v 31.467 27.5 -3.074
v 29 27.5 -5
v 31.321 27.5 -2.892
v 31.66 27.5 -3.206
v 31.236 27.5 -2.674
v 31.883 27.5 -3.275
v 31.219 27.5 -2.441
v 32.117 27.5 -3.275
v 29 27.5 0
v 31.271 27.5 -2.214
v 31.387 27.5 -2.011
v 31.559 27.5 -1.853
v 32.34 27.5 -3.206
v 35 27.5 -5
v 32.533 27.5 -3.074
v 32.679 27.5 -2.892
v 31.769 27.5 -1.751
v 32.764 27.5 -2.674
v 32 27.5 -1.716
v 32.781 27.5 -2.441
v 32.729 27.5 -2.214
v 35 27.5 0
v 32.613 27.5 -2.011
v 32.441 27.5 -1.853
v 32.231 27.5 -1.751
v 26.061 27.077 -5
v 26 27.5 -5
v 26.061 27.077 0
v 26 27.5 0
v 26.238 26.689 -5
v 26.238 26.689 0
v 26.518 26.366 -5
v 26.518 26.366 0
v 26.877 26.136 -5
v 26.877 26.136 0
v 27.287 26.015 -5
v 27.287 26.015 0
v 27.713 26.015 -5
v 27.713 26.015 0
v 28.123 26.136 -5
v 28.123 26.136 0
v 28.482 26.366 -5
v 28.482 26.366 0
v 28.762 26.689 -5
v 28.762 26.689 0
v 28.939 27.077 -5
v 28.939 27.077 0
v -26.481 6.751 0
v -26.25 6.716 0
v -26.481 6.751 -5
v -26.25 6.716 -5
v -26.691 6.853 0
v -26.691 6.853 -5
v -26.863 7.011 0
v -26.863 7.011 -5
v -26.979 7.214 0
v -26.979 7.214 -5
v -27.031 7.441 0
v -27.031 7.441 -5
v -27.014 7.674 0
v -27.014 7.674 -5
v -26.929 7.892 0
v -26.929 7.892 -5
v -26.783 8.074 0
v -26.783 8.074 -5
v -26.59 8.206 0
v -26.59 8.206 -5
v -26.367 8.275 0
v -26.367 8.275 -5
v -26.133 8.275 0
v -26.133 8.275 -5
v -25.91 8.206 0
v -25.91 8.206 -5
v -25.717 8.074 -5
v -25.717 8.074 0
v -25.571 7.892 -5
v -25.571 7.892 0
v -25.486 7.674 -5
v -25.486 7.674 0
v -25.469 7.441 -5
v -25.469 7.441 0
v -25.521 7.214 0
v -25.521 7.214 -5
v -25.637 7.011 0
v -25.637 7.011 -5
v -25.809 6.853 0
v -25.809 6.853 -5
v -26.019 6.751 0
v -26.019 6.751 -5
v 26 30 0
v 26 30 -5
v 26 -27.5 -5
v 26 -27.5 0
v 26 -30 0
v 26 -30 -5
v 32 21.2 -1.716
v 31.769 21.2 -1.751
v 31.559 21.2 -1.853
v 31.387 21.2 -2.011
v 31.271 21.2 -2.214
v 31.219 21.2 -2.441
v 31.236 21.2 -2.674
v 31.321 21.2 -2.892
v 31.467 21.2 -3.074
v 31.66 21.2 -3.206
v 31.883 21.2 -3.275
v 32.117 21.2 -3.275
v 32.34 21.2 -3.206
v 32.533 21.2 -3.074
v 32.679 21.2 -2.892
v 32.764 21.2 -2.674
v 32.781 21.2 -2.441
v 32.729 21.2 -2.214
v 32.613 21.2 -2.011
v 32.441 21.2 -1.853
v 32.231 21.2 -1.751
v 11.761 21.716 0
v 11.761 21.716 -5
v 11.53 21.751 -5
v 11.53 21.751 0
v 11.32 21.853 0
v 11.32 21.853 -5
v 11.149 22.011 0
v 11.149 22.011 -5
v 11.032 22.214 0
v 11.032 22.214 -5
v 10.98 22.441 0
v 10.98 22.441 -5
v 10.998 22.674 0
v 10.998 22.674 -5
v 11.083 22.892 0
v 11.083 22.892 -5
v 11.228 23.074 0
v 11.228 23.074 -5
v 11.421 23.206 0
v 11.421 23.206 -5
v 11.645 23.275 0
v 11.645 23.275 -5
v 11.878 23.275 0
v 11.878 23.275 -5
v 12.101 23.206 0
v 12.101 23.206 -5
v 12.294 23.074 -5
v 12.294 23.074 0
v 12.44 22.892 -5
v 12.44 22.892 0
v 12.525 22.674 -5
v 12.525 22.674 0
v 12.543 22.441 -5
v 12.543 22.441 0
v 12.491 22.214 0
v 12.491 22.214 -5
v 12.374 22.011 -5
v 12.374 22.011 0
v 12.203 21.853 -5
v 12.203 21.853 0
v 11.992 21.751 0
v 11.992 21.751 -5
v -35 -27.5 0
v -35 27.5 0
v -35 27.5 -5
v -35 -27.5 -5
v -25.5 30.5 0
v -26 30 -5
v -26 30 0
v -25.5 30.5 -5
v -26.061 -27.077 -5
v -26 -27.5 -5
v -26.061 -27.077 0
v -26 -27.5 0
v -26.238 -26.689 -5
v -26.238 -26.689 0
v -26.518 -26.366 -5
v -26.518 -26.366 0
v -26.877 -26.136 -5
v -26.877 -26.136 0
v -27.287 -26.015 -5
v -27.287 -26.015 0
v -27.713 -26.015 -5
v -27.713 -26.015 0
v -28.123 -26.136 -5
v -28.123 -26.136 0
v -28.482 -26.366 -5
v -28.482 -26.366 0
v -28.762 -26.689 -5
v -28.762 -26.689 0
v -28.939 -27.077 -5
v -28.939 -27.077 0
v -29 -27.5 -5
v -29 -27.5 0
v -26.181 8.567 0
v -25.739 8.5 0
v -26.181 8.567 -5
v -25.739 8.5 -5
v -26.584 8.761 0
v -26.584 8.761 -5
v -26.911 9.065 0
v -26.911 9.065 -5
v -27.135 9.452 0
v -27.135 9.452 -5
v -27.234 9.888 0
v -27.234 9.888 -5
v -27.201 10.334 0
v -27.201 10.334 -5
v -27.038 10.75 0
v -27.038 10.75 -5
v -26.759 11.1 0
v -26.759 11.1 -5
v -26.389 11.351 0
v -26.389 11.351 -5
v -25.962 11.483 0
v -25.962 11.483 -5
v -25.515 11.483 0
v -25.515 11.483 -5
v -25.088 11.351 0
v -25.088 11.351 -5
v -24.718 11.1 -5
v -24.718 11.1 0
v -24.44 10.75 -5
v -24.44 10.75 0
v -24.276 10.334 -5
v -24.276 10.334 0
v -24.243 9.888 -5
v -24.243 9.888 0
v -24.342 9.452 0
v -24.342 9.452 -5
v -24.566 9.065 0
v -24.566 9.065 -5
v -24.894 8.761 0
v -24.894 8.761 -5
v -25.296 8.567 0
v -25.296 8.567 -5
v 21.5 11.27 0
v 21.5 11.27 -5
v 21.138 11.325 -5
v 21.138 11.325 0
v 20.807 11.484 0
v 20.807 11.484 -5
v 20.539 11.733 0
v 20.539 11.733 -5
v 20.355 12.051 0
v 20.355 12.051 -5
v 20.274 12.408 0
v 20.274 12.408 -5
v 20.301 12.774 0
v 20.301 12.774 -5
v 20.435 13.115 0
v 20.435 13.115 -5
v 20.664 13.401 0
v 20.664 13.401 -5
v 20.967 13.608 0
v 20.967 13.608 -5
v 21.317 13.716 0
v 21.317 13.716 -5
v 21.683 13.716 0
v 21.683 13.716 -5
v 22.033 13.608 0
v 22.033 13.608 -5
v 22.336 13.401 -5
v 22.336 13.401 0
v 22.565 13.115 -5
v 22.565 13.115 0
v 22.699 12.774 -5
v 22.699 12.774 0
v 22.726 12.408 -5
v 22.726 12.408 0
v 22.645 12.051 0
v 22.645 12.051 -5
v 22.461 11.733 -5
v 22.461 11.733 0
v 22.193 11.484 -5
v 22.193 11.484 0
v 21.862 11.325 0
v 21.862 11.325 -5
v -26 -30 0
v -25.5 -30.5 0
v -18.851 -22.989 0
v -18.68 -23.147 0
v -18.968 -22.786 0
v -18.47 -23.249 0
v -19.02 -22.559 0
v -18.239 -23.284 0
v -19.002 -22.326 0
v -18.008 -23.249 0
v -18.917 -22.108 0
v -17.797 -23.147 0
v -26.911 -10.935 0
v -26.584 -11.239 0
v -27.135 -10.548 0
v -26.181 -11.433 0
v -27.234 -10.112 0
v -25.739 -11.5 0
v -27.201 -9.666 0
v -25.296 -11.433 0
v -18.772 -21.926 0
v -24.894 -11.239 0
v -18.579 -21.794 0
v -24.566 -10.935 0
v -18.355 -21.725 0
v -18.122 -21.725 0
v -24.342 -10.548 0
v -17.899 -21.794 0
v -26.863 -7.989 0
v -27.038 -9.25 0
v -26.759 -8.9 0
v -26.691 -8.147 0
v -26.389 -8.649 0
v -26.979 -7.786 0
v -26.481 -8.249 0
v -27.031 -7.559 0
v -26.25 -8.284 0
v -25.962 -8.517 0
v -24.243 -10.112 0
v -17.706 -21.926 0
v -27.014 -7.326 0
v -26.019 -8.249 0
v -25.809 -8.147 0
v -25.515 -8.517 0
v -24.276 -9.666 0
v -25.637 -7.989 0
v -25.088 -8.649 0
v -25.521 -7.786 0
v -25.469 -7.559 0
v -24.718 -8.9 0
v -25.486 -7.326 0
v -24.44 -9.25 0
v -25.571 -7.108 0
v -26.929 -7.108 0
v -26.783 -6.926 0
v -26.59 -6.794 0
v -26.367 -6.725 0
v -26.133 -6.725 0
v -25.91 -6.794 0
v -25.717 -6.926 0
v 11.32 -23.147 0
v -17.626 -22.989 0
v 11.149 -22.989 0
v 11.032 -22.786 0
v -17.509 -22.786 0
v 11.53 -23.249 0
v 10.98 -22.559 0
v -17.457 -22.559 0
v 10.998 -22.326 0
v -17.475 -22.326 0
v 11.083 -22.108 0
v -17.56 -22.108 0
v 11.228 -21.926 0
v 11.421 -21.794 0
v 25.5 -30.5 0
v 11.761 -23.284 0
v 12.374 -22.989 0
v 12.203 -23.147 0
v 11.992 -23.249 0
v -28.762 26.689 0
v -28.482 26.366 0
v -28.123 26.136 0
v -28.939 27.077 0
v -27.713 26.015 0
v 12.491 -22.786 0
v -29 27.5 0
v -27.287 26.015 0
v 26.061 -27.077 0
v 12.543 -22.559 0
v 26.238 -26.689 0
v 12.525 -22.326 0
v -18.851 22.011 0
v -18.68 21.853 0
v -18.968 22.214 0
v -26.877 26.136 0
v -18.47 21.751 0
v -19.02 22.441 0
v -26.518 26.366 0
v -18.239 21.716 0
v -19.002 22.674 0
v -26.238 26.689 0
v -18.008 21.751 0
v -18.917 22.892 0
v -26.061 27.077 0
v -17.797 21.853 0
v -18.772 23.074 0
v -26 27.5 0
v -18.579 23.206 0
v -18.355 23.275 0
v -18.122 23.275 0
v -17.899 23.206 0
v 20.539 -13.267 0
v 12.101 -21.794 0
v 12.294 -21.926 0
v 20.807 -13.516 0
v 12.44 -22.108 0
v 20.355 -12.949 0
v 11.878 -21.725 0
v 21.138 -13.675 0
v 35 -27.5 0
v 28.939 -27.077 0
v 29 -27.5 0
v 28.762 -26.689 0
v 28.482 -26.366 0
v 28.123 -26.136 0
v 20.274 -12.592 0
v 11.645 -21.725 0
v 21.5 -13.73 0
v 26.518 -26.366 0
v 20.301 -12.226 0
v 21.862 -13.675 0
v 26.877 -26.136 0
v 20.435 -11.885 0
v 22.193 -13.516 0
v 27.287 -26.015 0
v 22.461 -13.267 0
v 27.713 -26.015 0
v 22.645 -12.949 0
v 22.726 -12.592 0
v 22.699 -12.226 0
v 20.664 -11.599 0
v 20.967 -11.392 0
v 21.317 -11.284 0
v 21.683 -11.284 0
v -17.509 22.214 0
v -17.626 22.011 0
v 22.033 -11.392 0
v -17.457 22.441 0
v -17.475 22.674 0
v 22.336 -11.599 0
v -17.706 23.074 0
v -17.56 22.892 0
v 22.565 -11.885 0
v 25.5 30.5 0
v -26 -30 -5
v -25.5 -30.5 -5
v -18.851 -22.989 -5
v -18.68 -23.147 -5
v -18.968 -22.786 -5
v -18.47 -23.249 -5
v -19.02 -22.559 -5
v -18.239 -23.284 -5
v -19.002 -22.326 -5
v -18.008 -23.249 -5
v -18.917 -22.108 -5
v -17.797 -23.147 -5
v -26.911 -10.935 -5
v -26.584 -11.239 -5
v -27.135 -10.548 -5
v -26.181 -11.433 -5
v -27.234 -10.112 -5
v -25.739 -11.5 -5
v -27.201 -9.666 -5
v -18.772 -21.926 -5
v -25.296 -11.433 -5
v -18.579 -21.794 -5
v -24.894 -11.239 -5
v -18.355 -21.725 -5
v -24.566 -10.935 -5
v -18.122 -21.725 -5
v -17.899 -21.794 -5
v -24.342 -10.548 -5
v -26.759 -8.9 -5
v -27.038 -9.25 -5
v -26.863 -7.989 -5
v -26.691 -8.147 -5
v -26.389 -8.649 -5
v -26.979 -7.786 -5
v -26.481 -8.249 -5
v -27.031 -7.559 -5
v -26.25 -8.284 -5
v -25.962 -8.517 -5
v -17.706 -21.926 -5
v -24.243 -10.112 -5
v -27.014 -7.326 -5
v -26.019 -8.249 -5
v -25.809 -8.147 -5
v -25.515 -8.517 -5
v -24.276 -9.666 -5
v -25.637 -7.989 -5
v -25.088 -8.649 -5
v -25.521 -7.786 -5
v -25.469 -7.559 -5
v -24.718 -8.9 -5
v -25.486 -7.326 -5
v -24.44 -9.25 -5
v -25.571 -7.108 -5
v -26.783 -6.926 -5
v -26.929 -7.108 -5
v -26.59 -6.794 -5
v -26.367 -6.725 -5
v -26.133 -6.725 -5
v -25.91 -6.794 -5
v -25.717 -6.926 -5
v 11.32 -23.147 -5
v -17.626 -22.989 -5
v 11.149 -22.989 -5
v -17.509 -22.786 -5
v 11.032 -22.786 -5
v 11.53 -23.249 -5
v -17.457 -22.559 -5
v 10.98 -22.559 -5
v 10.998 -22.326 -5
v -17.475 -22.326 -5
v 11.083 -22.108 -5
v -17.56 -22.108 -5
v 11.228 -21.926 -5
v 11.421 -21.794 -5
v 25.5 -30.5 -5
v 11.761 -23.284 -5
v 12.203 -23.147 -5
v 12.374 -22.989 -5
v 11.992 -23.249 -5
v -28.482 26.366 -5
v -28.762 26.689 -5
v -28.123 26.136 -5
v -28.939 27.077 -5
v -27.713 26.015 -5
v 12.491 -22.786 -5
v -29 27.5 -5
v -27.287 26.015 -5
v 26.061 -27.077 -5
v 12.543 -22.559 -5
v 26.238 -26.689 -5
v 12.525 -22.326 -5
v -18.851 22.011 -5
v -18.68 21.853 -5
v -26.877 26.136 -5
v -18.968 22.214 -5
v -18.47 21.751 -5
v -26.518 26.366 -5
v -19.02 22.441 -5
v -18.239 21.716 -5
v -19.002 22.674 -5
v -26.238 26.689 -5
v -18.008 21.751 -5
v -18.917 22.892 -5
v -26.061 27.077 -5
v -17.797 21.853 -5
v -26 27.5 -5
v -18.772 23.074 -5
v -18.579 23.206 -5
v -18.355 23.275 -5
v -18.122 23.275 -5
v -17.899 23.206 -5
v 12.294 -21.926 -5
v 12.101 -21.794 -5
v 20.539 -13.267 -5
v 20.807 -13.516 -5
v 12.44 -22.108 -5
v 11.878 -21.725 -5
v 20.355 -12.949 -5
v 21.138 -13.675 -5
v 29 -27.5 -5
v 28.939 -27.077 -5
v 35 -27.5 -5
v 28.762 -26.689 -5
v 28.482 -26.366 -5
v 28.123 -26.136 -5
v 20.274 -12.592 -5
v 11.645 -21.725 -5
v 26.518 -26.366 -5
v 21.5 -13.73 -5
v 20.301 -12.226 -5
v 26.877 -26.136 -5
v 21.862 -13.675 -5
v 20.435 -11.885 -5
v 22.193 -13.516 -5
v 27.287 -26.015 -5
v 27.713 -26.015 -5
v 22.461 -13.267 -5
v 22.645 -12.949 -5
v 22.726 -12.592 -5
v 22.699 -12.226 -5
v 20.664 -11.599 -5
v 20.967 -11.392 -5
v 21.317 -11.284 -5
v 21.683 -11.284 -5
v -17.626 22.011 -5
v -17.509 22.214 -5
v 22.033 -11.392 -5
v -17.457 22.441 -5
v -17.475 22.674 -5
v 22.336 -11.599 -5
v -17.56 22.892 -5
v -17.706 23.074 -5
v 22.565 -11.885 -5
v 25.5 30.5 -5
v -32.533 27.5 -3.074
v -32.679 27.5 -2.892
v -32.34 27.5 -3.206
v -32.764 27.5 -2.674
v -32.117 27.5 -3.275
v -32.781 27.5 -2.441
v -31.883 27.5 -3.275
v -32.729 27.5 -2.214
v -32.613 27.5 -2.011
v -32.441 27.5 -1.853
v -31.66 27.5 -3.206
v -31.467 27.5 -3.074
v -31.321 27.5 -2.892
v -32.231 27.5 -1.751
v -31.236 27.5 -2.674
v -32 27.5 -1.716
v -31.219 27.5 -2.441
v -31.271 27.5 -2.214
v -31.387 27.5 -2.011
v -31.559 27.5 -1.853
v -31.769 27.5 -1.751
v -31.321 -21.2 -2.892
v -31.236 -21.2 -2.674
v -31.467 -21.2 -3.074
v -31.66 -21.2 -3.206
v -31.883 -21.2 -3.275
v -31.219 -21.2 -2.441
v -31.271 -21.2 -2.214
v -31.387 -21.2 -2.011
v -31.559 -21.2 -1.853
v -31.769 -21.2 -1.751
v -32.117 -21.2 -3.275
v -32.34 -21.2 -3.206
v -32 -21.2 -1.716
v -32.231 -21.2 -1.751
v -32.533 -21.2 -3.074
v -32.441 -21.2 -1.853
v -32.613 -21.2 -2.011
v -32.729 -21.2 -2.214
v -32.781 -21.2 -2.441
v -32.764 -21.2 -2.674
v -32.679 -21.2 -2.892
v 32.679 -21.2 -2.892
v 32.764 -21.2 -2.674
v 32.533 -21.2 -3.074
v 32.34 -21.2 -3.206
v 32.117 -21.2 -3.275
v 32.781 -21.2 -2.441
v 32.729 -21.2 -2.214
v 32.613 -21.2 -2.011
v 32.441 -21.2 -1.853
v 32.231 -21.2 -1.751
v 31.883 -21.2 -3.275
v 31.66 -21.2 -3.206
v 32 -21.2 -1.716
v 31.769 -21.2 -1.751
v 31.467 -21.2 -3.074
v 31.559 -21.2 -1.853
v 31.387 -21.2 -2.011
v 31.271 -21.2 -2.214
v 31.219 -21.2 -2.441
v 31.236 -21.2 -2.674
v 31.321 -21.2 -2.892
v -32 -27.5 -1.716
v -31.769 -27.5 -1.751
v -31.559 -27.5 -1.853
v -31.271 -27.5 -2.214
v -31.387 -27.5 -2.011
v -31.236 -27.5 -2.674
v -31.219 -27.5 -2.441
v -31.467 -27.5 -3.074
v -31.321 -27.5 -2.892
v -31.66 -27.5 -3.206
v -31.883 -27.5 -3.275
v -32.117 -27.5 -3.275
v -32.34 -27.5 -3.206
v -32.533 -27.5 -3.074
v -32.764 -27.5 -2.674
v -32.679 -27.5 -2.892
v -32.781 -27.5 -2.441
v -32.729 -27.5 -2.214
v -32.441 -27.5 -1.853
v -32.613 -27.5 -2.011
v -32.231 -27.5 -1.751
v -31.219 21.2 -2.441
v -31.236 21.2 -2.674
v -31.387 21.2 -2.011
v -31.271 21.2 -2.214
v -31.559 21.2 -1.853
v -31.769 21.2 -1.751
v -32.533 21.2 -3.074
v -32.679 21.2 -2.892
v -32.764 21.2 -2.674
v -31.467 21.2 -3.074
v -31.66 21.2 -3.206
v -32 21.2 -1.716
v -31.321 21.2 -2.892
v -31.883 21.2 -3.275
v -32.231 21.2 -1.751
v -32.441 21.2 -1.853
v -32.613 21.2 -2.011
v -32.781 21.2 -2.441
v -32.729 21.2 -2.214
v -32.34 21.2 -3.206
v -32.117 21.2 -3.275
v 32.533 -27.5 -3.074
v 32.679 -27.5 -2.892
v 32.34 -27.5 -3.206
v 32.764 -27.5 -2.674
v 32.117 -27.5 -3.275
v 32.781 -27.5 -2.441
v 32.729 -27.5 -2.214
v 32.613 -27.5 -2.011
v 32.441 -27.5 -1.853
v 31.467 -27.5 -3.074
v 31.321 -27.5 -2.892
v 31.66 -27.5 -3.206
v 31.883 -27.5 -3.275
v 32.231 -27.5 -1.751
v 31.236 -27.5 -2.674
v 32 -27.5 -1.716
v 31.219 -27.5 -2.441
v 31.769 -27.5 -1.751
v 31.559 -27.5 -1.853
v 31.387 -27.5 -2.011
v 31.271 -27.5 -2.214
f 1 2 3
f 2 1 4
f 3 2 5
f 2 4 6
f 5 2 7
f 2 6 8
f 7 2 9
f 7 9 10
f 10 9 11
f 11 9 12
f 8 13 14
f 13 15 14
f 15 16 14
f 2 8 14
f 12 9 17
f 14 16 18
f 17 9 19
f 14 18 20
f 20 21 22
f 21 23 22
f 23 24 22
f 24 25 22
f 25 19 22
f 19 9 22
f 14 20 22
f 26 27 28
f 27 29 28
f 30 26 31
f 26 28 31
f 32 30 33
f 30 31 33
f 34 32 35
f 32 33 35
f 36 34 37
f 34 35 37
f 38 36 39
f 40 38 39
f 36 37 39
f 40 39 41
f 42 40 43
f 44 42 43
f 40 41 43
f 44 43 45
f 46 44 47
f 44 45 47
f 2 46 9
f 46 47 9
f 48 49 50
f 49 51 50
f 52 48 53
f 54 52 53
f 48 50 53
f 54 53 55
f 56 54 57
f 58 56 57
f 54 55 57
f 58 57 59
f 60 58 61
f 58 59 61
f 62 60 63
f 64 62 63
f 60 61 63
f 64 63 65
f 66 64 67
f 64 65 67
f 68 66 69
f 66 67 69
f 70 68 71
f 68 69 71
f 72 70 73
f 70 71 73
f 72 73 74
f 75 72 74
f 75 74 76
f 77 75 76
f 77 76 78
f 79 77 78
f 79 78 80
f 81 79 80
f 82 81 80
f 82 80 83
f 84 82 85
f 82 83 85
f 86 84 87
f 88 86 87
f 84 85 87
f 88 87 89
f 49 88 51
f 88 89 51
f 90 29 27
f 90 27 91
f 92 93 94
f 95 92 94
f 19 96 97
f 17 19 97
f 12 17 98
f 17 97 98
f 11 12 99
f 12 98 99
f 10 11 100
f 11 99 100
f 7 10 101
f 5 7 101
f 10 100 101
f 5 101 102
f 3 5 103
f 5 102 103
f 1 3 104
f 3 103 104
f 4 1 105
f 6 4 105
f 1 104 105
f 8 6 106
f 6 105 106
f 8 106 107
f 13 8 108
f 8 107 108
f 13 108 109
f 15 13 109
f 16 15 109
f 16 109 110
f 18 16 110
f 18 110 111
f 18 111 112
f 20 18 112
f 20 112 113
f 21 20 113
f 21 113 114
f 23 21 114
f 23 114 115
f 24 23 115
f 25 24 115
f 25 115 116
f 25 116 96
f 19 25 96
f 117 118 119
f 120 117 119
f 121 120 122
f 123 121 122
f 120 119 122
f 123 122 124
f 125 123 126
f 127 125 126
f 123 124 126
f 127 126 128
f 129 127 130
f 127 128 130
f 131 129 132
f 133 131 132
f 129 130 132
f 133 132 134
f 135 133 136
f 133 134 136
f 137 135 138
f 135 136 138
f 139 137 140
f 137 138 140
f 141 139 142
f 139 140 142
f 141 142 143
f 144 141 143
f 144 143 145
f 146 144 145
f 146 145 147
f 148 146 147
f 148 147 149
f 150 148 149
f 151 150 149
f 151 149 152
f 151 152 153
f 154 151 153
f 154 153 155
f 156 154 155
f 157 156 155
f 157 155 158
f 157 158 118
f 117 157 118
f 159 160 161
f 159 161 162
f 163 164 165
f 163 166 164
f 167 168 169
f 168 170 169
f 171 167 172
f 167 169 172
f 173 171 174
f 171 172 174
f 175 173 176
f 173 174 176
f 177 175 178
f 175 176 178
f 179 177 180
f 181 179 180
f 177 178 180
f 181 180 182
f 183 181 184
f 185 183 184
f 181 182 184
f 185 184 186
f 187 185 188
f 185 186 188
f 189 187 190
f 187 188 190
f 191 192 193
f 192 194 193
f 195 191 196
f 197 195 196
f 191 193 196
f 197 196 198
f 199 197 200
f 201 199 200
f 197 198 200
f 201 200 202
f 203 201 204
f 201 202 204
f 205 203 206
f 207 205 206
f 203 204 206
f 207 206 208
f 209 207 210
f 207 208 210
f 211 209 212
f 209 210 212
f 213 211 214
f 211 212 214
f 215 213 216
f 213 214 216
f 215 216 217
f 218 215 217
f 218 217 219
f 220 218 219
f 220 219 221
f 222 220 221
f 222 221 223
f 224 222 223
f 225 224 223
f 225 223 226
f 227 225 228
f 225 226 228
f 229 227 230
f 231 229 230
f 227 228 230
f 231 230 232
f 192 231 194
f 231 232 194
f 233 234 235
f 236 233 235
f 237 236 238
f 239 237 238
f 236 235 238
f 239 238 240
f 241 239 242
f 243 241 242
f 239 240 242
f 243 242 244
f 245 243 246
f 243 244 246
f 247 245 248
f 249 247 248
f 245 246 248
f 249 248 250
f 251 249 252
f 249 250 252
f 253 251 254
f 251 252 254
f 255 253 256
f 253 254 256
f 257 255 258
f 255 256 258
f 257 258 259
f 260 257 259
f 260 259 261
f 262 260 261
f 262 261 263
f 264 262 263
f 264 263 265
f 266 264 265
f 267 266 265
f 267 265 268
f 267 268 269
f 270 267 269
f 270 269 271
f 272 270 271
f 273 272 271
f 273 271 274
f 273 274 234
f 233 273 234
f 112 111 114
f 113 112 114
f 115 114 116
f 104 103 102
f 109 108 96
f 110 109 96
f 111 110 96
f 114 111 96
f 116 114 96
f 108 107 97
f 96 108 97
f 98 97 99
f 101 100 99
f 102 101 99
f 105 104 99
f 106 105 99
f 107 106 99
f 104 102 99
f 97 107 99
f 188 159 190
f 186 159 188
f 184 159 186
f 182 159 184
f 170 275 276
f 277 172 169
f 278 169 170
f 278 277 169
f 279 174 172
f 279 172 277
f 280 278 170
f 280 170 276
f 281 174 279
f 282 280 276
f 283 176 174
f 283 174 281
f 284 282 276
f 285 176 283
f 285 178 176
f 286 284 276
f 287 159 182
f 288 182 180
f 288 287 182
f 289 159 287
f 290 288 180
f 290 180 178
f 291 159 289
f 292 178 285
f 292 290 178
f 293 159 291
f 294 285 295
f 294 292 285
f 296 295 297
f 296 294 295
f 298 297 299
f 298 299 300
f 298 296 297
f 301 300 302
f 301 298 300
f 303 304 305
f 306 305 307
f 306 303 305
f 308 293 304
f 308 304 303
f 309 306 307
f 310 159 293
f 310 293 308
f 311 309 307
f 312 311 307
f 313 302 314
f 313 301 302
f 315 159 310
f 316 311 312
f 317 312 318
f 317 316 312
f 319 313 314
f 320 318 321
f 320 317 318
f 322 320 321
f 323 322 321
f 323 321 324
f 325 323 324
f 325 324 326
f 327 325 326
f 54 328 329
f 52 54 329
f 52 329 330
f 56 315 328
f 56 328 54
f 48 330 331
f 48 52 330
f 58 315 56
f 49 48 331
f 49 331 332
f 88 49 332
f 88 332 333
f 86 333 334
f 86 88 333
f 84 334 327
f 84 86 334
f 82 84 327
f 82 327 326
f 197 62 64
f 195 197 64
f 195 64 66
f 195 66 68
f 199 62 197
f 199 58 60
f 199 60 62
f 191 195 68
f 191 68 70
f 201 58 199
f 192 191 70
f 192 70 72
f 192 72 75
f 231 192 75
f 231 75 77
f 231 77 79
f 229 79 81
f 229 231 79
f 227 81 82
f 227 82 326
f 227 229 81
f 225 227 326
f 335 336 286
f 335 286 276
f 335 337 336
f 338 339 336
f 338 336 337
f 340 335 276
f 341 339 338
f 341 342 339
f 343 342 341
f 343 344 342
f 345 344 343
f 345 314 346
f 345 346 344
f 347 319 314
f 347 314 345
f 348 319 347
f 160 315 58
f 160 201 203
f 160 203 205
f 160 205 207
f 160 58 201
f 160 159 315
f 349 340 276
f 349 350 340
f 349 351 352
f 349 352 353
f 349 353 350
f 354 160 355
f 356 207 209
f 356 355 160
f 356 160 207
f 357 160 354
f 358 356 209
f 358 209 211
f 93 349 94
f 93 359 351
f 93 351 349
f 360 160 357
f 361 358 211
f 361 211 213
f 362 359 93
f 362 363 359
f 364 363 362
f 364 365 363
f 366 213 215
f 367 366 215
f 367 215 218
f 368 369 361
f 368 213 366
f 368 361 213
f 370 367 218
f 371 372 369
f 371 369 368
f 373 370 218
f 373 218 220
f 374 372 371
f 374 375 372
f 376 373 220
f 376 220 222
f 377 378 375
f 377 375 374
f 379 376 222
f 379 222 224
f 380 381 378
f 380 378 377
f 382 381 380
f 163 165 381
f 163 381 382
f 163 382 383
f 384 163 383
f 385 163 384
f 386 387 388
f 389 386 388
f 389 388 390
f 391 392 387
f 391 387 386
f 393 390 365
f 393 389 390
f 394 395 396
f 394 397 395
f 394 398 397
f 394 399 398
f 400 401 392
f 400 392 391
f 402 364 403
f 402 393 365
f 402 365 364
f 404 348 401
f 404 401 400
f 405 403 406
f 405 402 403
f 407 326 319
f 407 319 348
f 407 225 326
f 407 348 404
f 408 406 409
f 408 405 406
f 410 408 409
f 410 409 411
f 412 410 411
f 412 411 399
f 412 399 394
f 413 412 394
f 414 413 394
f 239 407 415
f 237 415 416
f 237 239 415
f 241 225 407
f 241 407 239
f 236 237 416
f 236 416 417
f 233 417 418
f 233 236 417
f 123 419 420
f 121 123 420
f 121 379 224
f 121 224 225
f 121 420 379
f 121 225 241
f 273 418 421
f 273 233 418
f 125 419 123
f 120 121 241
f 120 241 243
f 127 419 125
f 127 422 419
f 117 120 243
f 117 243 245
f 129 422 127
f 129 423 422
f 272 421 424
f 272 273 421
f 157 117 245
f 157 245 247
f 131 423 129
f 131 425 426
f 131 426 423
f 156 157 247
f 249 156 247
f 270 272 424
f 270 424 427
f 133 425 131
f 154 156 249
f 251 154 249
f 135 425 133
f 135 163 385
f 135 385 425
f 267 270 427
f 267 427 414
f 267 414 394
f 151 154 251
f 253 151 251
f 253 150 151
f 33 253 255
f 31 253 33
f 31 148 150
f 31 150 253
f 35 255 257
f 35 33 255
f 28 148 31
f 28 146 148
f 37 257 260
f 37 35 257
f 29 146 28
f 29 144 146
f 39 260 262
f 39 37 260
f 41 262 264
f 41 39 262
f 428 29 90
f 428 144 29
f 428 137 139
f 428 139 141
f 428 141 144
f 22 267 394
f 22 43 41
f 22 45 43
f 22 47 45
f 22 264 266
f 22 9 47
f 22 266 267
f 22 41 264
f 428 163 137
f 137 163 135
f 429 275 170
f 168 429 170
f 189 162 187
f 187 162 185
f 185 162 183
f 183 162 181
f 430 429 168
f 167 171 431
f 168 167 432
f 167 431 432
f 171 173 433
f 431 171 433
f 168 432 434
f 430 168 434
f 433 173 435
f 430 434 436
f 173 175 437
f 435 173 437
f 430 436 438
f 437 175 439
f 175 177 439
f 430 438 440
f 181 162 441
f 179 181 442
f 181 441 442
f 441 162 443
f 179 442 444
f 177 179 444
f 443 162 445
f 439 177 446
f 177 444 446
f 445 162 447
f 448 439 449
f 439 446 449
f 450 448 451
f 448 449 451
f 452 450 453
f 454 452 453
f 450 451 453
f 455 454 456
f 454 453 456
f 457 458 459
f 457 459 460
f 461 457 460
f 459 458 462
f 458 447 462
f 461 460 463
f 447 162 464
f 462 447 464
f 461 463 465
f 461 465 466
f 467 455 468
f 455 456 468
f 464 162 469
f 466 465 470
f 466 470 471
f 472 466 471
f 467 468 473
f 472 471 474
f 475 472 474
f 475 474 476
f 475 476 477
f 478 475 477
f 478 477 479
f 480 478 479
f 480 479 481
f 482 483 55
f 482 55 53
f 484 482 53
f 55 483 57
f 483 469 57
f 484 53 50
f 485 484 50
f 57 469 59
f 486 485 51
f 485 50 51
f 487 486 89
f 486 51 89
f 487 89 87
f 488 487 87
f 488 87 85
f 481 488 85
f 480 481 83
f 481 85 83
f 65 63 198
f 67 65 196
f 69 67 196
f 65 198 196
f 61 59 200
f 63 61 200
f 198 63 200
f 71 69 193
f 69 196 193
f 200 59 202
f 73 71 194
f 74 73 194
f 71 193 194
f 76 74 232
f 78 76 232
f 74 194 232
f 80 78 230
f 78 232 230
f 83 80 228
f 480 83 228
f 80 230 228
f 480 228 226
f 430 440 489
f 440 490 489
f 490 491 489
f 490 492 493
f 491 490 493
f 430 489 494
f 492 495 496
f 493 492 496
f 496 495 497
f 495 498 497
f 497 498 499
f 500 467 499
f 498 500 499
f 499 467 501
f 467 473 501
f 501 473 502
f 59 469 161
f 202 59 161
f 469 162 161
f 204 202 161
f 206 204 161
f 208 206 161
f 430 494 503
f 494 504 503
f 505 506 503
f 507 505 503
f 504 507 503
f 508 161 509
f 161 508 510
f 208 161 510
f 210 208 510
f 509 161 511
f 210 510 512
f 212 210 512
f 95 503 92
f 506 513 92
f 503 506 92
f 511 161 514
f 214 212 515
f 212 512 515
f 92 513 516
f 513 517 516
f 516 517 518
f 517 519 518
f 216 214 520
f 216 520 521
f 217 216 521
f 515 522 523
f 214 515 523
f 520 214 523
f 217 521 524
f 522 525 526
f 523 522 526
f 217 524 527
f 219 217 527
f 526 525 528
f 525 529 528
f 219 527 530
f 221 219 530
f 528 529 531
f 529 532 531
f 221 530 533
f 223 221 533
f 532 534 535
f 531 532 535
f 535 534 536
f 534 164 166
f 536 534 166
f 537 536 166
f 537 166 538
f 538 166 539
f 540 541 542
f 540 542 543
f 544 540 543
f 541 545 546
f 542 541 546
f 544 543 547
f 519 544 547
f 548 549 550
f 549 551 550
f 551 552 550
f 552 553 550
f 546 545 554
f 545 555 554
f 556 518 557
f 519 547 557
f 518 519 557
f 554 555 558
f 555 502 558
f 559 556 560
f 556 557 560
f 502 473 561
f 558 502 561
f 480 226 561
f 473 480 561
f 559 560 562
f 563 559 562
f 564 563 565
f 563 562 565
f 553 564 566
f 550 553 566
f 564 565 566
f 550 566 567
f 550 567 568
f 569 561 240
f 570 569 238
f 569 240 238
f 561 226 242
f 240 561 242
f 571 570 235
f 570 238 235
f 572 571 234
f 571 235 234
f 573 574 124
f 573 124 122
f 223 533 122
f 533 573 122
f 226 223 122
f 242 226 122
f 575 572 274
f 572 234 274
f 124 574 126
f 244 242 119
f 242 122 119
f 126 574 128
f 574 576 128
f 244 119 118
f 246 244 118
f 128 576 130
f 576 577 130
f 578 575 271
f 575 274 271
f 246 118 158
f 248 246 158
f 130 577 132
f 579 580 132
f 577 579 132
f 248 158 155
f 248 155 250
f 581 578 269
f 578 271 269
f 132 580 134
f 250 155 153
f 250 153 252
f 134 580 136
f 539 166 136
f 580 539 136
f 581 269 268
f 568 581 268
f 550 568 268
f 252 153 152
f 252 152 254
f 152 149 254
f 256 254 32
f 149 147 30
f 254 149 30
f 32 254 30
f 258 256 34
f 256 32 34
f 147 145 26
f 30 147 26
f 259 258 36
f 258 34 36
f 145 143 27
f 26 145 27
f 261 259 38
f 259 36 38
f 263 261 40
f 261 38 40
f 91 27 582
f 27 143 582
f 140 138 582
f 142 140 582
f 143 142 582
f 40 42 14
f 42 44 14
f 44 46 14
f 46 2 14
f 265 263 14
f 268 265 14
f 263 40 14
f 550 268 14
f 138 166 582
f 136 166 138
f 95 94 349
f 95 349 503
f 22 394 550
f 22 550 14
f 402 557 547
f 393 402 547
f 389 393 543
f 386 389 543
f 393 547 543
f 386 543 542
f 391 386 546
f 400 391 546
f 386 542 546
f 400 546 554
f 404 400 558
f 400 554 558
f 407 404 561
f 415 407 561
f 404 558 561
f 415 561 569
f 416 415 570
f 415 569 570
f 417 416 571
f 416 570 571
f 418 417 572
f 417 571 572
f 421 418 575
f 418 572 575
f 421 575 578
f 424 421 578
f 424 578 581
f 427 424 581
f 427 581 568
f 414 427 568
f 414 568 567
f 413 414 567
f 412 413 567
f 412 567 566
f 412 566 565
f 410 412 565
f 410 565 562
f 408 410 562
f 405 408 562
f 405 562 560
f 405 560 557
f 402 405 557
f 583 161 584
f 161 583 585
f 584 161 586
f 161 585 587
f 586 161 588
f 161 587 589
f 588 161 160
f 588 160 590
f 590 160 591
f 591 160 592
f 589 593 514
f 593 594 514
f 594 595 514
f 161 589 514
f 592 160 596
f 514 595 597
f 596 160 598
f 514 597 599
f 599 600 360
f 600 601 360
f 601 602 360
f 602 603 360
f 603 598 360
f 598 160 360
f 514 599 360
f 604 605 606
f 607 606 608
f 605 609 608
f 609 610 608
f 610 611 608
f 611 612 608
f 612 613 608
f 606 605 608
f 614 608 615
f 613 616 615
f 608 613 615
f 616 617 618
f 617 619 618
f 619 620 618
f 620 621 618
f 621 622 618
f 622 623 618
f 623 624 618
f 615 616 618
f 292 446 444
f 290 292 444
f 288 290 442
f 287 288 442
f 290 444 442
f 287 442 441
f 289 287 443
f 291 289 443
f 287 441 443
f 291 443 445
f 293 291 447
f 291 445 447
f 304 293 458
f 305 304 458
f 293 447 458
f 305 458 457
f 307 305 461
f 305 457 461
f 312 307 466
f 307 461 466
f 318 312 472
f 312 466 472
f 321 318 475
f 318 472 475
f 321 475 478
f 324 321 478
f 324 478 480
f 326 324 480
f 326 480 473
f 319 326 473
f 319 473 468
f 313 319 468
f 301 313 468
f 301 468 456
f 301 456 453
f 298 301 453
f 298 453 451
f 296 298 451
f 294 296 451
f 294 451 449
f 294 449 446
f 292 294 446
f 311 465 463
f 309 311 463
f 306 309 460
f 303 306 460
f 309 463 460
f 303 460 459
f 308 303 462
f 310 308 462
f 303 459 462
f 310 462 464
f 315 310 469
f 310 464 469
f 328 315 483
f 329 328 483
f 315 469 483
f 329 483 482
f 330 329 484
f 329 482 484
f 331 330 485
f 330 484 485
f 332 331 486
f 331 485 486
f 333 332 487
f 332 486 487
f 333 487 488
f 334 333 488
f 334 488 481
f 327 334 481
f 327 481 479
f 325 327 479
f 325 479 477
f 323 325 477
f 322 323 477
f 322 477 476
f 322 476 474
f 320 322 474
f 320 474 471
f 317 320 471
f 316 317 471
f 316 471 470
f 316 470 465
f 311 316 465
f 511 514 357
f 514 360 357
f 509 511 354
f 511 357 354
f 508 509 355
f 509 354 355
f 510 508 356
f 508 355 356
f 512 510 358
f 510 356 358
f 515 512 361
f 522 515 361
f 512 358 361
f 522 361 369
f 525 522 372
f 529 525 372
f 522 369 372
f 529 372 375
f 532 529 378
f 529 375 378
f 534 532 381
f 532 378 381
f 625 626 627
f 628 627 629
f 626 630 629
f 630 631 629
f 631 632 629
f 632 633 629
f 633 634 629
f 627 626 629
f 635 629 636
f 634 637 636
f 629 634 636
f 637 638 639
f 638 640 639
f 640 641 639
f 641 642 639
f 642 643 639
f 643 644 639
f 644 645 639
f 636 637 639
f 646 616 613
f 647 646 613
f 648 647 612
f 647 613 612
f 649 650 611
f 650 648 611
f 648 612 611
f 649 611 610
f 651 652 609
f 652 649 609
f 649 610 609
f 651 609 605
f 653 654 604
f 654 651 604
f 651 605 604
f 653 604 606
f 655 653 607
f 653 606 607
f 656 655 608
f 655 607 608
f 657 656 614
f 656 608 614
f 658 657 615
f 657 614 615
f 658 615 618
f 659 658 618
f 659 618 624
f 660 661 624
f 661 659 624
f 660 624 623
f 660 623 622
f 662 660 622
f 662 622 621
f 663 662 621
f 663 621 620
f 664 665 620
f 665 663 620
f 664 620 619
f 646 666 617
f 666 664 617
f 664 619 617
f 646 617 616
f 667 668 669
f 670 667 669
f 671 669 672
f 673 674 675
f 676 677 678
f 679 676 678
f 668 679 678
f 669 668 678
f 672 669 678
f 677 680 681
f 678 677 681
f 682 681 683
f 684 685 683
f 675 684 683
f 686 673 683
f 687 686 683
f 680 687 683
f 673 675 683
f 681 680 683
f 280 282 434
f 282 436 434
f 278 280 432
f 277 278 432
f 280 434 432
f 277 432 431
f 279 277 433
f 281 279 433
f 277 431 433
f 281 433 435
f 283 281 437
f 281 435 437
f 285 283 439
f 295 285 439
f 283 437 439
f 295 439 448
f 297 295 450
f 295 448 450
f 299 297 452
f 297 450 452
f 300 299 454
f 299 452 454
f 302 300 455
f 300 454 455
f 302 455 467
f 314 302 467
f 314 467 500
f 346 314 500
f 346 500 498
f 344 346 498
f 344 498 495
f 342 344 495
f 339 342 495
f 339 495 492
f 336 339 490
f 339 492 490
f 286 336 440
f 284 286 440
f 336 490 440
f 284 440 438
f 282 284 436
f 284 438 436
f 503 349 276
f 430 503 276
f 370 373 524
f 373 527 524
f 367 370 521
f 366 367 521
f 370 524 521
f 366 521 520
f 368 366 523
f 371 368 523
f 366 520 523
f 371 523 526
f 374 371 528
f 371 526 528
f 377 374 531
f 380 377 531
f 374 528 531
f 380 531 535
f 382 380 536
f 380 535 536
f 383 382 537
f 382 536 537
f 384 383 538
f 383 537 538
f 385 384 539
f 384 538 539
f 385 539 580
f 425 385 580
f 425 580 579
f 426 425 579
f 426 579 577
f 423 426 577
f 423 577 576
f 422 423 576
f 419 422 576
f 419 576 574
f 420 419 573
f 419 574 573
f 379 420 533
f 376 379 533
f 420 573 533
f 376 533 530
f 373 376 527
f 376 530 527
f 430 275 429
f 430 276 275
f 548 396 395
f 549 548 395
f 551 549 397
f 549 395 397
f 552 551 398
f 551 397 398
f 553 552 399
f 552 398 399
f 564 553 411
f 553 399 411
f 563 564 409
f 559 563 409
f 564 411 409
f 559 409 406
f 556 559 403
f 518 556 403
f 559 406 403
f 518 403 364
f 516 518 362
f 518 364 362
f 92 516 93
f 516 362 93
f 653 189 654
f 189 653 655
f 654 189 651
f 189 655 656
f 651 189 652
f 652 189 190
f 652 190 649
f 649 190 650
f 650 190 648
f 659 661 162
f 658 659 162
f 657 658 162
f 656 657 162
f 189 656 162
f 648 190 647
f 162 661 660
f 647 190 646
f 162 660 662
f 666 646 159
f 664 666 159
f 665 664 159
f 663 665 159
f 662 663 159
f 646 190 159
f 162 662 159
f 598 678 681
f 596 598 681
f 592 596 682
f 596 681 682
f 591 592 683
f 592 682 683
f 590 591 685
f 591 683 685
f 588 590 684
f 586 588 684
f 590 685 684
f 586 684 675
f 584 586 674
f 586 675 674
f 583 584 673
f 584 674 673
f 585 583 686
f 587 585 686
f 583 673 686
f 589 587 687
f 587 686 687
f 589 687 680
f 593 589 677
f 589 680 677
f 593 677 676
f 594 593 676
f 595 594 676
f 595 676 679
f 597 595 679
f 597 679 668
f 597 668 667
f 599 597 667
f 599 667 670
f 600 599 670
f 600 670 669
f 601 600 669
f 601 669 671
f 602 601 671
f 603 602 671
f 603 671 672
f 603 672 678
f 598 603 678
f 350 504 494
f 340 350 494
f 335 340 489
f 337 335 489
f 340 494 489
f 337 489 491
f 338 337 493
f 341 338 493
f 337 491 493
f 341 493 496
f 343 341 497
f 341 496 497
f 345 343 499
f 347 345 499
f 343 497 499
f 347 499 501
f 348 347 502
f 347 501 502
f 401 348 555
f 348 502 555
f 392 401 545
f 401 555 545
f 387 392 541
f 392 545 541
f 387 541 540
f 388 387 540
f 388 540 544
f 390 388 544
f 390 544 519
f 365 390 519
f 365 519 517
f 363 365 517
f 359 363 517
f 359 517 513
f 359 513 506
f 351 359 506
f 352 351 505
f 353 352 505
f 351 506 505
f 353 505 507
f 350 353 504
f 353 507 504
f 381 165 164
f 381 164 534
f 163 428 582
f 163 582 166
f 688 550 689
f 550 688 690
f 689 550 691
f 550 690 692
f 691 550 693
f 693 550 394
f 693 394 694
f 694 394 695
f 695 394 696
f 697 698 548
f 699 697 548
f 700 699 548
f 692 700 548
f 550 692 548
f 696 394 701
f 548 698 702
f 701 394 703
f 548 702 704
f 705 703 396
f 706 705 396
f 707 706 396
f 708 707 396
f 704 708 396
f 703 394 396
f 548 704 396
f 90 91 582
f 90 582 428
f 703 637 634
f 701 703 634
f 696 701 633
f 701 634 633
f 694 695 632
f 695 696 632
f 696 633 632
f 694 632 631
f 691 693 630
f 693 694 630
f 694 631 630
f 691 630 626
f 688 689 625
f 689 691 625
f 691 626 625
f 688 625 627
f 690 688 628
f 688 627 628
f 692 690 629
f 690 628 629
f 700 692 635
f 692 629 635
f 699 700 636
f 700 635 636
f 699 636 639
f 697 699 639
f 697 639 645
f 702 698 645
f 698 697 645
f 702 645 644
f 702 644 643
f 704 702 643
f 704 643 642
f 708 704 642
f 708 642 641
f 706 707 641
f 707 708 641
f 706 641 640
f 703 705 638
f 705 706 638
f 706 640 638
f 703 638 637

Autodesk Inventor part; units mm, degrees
ref_plane "YZ Plane" through (0, 0, 0) normal (1, 0, 0) x (0, 1, 0)
ref_plane "XZ Plane" through (0, 0, 0) normal (0, 1, 0) x (-1, 0, 0)
ref_plane "XY Plane" through (0, 0, 0) normal (0, 0, 1) x (1, 0, 0)
sketch "Sketch1" plane through (0, 0, 0) normal (0, 0, 1) x (1, 0, 0)
  line L0 (35, 27.5) -> (-35, 27.5) construction
  line L1 (-35, 27.5) -> (-35, -27.5)
  line L2 (-35, -27.5) -> (35, -27.5) construction
  line L3 (35, -27.5) -> (35, 27.5)
  line L4 (35, 27.5) -> (-35, -27.5) construction
  line L5 (-35, 27.5) -> (35, -27.5) construction
  line L6 (0, 27.5) -> (0, -27.5) construction
  line L7 (35, 0) -> (-35, 0) construction
  line L8 (26, 27.5) -> (26, 30.5)
  line L9 (26, 30.5) -> (-26, 30.5)
  line L10 (-26, 30.5) -> (-26, 27.5)
  arc A0 (-29, 27.5) -> (-26, 27.5) centre (-27.5, 27.5) ccw
  line L11 (26, -27.5) -> (26, -30.5)
  line L12 (26, -30.5) -> (-26, -30.5)
  line L13 (-26, -30.5) -> (-26, -27.5)
  arc A1 (-26, -27.5) -> (-29, -27.5) centre (-27.5, -27.5) ccw
  line L14 (-32, 27.5) -> (-32, 21.5) construction
  line L15 (0, 30.5) -> (0, 27.5) construction
  line L16 (32, 27.5) -> (32, 21.5) construction
  arc A2 (26, 27.5) -> (29, 27.5) centre (27.5, 27.5) ccw
  arc A3 (29, -27.5) -> (26, -27.5) centre (27.5, -27.5) ccw
  line L17 (-17.5, -10) -> (-35, -10) construction
  line L18 (-35, -10) -> (-35, 10) construction
  line L19 (-35, 10) -> (-17.5, 10) construction
  line L20 (-17.5, 10) -> (-17.5, -10) construction
  line L21 (-17.5, -10) -> (-35, 10) construction
  line L22 (-35, -10) -> (-17.5, 10) construction
  line L23 (-26.25, -7.5) -> (-26.25, 7.5) construction
  line L24 (-25.7386, -10) -> (-25.7386, 10) construction
  circle A4 centre (-25.7386, 10) radius 2.5 construction
  line L25 (-33, 3.75) -> (-32, 3.75)
  line L26 (-30, 1.75) -> (-30, -1.75)
  line L27 (-32, -3.75) -> (-33, -3.75)
  arc A5 (-32, -3.75) -> (-30, -1.75) centre (-32, -1.75) ccw
  arc A6 (-30, 1.75) -> (-32, 3.75) centre (-32, 1.75) ccw
  arc A7 (-35, 5.75) -> (-33, 3.75) centre (-33, 5.75) ccw
  line L28 (35, -27.5) -> (29, -27.5)
  line L29 (-29, -27.5) -> (-35, -27.5)
  line L30 (-35, 27.5) -> (-29, 27.5)
  line L31 (29, 27.5) -> (35, 27.5)
  circle A8 centre (-26.25, 7.5) radius 2.5 construction
  line L32 (14.2614, -25) -> (-20.7386, -25) construction
  line L33 (-20.7386, -25) -> (-20.7386, 25) construction
  line L34 (-20.7386, 25) -> (14.2614, 25) construction
  line L35 (14.2614, 25) -> (14.2614, -25) construction
  line L36 (14.2614, -25) -> (-20.7386, 25) construction
  line L37 (-20.7386, -25) -> (14.2614, 25) construction
  line L38 (11.7614, 22.5) -> (-18.2386, 22.5) construction
  line L39 (-18.2386, 22.5) -> (-18.2386, -22.5) construction
  line L40 (-18.2386, -22.5) -> (11.7614, -22.5) construction
  line L41 (11.7614, -22.5) -> (11.7614, 22.5) construction
  line L42 (11.7614, 22.5) -> (-18.2386, -22.5) construction
  line L43 (-18.2386, 22.5) -> (11.7614, -22.5) construction
  circle A9 centre (-18.2386, 22.5) radius 2.5 construction
  arc A10 (-21.2236, 22.2) -> (-15.2536, 22.2) centre (-18.2386, 22.5) ccw
  line L44 (-21.2386, 10) -> (-21.2386, 3)
  line L45 (-13.2637, 24) -> (6.7865, 24)
  arc A11 (8.7764, 22.2) -> (14.7464, 22.2) centre (11.7614, 22.5) ccw
  arc A12 (32.802, 10.6698) -> (32.3609, 9.408) centre (46.2004, 5.2778) ccw
  line L46 (32.9466, 11.4165) -> (32.9466, 22)
  line L47 (30.9466, 24) -> (16.7363, 24)
  arc A13 (32.802, 10.6698) -> (32.9466, 11.4165) centre (30.9466, 11.4165) ccw
  line L48 (34.9466, 11.4165) -> (32.9466, 11.4165) construction
  line L49 (32.802, 8.6698) -> (32.802, 10.6698) construction
  line L50 (30.4444, 7.9799) -> (22.1342, 7.9799)
  line L51 (15.9549, 1.8007) -> (15.9549, 3)
  line L52 (13.9549, 1) -> (-19.2386, 1)
  arc A14 (30.4444, 7.9799) -> (32.3609, 9.408) centre (30.4444, 9.9799) ccw
  arc A15 (32.9466, 22) -> (30.9466, 24) centre (30.9466, 22) ccw
  arc A16 (16.7363, 24) -> (14.7464, 22.2) centre (16.7363, 22) ccw
  arc A17 (8.7764, 22.2) -> (6.7865, 24) centre (6.7865, 22) ccw
  arc A18 (-13.2637, 24) -> (-15.2536, 22.2) centre (-13.2637, 22) ccw
  arc A19 (-21.2386, 3) -> (-19.2386, 1) centre (-19.2386, 3) ccw
  arc A20 (13.9549, 1) -> (15.9549, 3) centre (13.9549, 3) ccw
  arc A21 (22.1342, 7.9799) -> (15.9549, 1.8007) centre (22.1342, 1.8007) ccw
  arc A22 (-15.2536, -22.2) -> (-21.2236, -22.2) centre (-18.2386, -22.5) ccw
  line L53 (-21.2386, -10) -> (-21.2386, -3)
  line L54 (-13.2637, -24) -> (6.7865, -24)
  arc A23 (14.7464, -22.2) -> (8.7764, -22.2) centre (11.7614, -22.5) ccw
  arc A24 (32.3609, -9.408) -> (32.802, -10.6698) centre (46.2004, -5.2778) ccw
  line L55 (32.9466, -11.4165) -> (32.9466, -22)
  line L56 (30.9466, -24) -> (16.7363, -24)
  arc A25 (32.9466, -11.4165) -> (32.802, -10.6698) centre (30.9466, -11.4165) ccw
  line L57 (30.4444, -7.9799) -> (22.1342, -7.9799)
  line L58 (15.9549, -1.8007) -> (15.9549, -3)
  line L59 (13.9549, -1) -> (-19.2386, -1)
  arc A26 (32.3609, -9.408) -> (30.4444, -7.9799) centre (30.4444, -9.9799) ccw
  arc A27 (30.9466, -24) -> (32.9466, -22) centre (30.9466, -22) ccw
  arc A28 (14.7464, -22.2) -> (16.7363, -24) centre (16.7363, -22) ccw
  arc A29 (6.7865, -24) -> (8.7764, -22.2) centre (6.7865, -22) ccw
  arc A30 (-15.2536, -22.2) -> (-13.2637, -24) centre (-13.2637, -22) ccw
  arc A31 (-19.2386, -1) -> (-21.2386, -3) centre (-19.2386, -3) ccw
  arc A32 (15.9549, -3) -> (13.9549, -1) centre (13.9549, -3) ccw
  arc A33 (15.9549, -1.8007) -> (22.1342, -7.9799) centre (22.1342, -1.8007) ccw
  line L60 (-32.9466, 13.8893) -> (-32.9466, 22)
  arc A34 (-30.9466, 24) -> (-32.9466, 22) centre (-30.9466, 22) ccw
  arc A35 (-21.2236, 22.2) -> (-23.2135, 24) centre (-23.2135, 22) ccw
  line L61 (-30.9466, 24) -> (-23.2135, 24)
  arc A36 (-21.2386, 10) -> (-29.3442, 12.6926) centre (-25.7386, 10) ccw
  arc A37 (-32.9466, 13.8893) -> (-29.3442, 12.6926) centre (-30.9466, 13.8893) ccw
  line L62 (-32.9466, -13.8893) -> (-32.9466, -22)
  arc A38 (-32.9466, -22) -> (-30.9466, -24) centre (-30.9466, -22) ccw
  line L63 (-30.9466, -24) -> (-23.2135, -24)
  arc A39 (-29.3442, -12.6926) -> (-21.2386, -10) centre (-25.7386, -10) ccw
  arc A40 (-29.3442, -12.6926) -> (-32.9466, -13.8893) centre (-30.9466, -13.8893) ccw
  arc A41 (-23.2135, -24) -> (-21.2236, -22.2) centre (-23.2135, -22) ccw
  line L64 (25, -16) -> (-25, -16) construction
  line L65 (-25, -16) -> (-25, 16) construction
  line L66 (-25, 16) -> (25, 16) construction
  line L67 (25, 16) -> (25, -16) construction
  line L68 (25, -16) -> (-25, 16) construction
  line L69 (-25, -16) -> (25, 16) construction
  line L70 (21.5, -12.5) -> (21.5, 12.5) construction
  point P0 (0, 0)
  point P1 (0, 0)
  point P2 (0, -0.0008)
  point P3 (-29, -27.5)
  point P4 (26, -27.5)
  point P5 (-26, -27.5)
  point P6 (-26, -27.5)
  point P7 (26, -27.5)
  point P8 (-26.25, 0)
  point P9 (29, -27.5)
  point P10 (29, -10)
  point P11 (-3.2386, 0)
  point P12 (-21.2386, 22.5)
  point P13 (-15.6405, 24)
  point P14 (9.1633, 24)
  point P15 (14.3595, 24)
  point P16 (32.0128, 7.9799)
  point P17 (0, 0)
  dimension "d19" = 3
  dimension "d20" = 52
  dimension "d37" = 55
  dimension "d40" = 6
  dimension "d41" = 6
  dimension "d59" = 70
  dimension "d60" = 1.5
  dimension "d61" = 17.5
  dimension "d62" = 20
  dimension "d63" = 15
  dimension "d90" = 20
  dimension "d98" = 5
  dimension "d100" = 7.5
  dimension "d101" = 5
  dimension "d111" = 5
  dimension "d113" = 50
  dimension "d114" = 35
  dimension "d115" = 5
  dimension "d117" = 5
  dimension "d118" = 2
  dimension "d119" = 2
  dimension "d120" = 2
  dimension "d124" = 2
  dimension "d125" = 2
  dimension "d126" = 3
  dimension "d128" = 50
  dimension "d129" = 32
  dimension "d130" = 25
  dimension "d131" = 3.5
  dimension "d140" = 0
  dimension "d141" = 10
extrude "Extrusion1" add sketch "Sketch1" against normal blind 5 contours L30 A0 L10 L9 L8 A2 L31 L3 L28 A3 L11 L12 L13 A1 L29 L1 | A10 A18 L45 A17 A11 A16 L47 A15 L46 A13 A12 A14 L50 A21 L51 A20 L52 A19 L44 A36 A37 L60 A34 L61 A35 | A22 A41 L63 A38 L62 A40 A39 L53 A31 L59 A32 L58 A33 L57 A26 A24 A25 L55 A27 L56 A28 A23 A29 L54 A30
hole "M2" at (-26.25, -7.5, 0) at (-26.25, 7.5, 0) at (11.7614, 22.5, 0) at (-18.2386, 22.5, 0) at (-18.2386, -22.5, 0) at (11.7614, -22.5, 0) direction (0, 0, -1) diameter 1.567 end through all thread size "M2x0.4" class "6H" standard "ANSI Metric M Profile"
hole "Phi3" at (-25.7386, -10, 0) at (-25.7386, 10, 0) direction (0, 0, -1) diameter 3 end through all
sketch "Sketch3" plane through (29, 27.5, 0) normal (0, 1, 0) x (1, 0, 0)
  line L0 (6, 0) -> (0, 0) projected
  line L1 (3, 0) -> (3, 5)
  line L2 (-58, 0) -> (-64, 0) projected
  line L3 (-61, 0) -> (-61, 5)
  line L4 (-64, 5) -> (-58, 5) projected
  line L5 (0, 5) -> (6, 5) projected
  point P0 (-29, 0)
  point P1 (3, 0)
  point P2 (3, 2.5)
  point P3 (-61, 2.5)
hole "Side-M2" at (32, 27.5, -2.5) at (-32, 27.5, -2.5) direction (0, -1, 0) diameter 1.567 depth 6.3 thread size "M2x0.4" class "6H" standard "ANSI Metric M Profile"
chamfer "C0.5" distance 0.5 angle 45 4 edges at (26, -30.5, -2.5) (-26, -30.5, -2.5) (26, 30.5, -2.5) (-26, 30.5, -2.5)
mirror "Mirror1" about plane through (0, 0, 0) normal (0, 1, 0) of "Side-M2"
hole "Hole6" at (21.5, -12.5, 0) at (21.5, 12.5, 0) direction (0, 0, -1) diameter 2.459 end through all thread size "M3x0.5" class "6H" standard "ANSI Metric M Profile"
properties part number "HeadCircuitMountFrame" material "Acetal Resin, Black"
